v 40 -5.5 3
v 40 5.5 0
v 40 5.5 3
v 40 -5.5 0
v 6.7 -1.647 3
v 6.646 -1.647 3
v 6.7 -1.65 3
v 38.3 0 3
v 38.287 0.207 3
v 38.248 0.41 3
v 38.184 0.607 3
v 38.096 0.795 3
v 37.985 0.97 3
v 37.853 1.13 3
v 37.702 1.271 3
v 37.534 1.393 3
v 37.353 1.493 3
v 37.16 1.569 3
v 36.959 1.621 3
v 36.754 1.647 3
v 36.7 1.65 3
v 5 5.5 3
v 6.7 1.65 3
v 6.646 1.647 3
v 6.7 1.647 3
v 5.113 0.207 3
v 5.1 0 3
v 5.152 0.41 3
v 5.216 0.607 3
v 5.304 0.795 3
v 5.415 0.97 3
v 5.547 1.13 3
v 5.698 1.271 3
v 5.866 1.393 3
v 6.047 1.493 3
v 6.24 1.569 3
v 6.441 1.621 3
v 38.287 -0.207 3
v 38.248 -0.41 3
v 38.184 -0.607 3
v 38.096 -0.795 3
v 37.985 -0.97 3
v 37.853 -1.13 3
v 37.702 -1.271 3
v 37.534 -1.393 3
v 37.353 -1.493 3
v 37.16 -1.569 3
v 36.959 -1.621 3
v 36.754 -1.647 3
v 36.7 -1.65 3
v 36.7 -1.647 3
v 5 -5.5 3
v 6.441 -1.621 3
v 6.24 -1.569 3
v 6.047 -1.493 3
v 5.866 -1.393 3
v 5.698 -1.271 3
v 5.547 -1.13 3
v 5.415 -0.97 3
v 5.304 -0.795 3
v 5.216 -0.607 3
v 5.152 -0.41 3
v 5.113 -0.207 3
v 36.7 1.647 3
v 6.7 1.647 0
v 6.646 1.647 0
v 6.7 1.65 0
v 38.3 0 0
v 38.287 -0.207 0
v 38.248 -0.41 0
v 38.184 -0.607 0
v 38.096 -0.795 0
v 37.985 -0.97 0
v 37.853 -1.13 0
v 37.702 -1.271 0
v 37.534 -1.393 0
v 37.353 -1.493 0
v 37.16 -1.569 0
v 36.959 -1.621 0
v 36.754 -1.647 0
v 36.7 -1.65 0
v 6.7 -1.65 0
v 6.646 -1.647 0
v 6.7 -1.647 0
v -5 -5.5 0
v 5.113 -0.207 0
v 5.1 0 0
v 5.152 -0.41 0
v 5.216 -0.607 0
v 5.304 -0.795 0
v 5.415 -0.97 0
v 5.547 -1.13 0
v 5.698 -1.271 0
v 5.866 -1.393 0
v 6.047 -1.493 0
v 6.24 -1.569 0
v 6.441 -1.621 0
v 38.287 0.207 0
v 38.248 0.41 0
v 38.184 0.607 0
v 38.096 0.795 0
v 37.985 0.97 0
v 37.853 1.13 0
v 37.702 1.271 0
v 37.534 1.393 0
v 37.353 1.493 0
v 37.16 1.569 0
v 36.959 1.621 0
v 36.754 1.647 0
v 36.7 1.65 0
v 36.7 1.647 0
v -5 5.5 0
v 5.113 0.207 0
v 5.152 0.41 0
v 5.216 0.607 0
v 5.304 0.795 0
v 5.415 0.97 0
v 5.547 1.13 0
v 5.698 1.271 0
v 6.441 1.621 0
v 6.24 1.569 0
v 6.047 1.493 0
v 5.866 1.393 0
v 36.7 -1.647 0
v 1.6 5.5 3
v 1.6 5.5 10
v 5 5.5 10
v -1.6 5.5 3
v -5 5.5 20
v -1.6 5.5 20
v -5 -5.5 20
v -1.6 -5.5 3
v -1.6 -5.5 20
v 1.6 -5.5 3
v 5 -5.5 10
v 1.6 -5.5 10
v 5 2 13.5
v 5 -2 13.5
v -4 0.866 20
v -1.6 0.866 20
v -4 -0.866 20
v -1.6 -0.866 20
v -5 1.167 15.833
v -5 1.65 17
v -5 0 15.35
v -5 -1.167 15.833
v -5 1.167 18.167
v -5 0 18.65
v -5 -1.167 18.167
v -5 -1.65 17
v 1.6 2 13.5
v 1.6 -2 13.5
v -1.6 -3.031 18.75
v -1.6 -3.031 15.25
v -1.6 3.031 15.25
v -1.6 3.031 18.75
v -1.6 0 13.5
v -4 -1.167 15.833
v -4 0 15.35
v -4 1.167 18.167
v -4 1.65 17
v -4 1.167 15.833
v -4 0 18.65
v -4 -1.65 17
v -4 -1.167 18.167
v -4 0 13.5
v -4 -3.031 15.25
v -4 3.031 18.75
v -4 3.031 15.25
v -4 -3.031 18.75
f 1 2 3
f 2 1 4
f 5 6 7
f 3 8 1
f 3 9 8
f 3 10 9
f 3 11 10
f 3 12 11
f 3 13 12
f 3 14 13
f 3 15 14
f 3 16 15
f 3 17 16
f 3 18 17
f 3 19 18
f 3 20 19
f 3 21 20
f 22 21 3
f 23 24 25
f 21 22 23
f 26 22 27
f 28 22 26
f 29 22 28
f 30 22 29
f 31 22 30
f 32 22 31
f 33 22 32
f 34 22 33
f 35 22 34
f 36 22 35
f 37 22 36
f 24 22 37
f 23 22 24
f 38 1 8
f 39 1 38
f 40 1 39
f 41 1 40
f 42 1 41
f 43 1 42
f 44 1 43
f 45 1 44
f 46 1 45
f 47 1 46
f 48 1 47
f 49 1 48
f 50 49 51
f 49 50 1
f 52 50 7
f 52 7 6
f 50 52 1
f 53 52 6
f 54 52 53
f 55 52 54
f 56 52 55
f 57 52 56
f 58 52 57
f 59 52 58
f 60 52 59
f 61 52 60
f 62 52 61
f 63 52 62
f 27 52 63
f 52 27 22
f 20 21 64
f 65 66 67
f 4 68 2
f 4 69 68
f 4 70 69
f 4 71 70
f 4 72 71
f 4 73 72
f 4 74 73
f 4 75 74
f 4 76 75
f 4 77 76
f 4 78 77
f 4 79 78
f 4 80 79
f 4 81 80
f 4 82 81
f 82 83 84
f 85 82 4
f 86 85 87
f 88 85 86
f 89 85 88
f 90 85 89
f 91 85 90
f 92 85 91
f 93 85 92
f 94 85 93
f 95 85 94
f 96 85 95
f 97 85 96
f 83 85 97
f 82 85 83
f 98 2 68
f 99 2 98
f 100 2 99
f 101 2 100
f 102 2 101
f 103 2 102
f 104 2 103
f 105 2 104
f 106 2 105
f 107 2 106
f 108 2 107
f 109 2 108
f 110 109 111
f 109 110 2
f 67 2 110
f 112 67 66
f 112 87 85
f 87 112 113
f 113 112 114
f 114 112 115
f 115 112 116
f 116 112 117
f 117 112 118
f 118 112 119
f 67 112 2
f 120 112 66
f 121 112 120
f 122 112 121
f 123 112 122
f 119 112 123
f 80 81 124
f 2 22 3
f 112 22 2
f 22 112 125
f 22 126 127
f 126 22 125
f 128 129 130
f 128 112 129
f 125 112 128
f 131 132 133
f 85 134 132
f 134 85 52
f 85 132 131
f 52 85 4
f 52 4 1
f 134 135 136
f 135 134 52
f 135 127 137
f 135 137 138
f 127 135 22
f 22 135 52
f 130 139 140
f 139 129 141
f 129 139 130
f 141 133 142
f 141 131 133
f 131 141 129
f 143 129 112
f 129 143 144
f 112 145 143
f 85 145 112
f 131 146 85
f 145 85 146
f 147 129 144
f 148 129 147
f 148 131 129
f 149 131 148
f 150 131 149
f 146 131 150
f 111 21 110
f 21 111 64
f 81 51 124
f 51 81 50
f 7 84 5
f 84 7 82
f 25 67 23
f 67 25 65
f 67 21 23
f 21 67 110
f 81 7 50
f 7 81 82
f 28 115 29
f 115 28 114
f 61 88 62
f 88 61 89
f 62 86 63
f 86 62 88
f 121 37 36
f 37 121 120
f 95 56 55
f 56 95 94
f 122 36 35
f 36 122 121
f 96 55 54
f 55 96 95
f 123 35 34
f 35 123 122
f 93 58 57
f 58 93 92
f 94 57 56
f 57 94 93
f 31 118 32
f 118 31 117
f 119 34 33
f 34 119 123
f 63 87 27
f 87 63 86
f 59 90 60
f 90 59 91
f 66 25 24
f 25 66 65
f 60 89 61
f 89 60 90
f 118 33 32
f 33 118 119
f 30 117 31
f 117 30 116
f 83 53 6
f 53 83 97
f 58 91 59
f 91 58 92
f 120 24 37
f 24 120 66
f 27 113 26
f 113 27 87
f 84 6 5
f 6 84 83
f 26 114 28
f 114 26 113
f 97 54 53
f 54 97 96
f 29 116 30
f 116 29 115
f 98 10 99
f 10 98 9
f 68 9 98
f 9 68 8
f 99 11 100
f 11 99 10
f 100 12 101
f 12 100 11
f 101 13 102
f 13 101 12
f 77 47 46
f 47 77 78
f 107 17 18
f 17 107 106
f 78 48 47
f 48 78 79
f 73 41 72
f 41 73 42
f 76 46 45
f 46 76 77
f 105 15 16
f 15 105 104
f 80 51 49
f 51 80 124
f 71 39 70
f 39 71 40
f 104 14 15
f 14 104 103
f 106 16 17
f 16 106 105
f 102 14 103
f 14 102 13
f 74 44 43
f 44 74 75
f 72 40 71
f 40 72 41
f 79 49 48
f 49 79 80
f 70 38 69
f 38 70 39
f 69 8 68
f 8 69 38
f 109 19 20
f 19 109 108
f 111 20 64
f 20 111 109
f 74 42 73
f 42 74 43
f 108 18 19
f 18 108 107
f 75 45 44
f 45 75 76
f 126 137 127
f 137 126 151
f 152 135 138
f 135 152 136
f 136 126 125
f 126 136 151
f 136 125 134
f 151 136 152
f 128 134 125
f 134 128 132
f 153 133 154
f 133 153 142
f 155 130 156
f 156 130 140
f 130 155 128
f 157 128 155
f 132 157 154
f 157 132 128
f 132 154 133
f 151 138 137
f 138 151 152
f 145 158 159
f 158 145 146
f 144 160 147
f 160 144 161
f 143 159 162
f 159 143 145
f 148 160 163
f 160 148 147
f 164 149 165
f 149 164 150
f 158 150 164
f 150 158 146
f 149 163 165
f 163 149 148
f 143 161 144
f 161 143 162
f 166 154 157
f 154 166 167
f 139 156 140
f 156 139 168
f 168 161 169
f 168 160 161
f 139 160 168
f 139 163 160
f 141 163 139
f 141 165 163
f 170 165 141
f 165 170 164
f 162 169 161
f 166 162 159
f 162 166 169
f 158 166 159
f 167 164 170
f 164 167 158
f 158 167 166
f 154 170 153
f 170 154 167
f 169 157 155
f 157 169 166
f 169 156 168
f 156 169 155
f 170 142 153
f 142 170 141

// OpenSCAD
// Robot DC-motor: sensor keyesIR - holder

// Vertical part.
h_vert = 40;
w_vert = 11;
d_vert =  3;

// Internal diameter of nut.
id_nut = 3.3;

// Out diameter of nut.
od_nut = 7;

// Height of nut.
h_nut = 4;

// Length and diameter of screws.
len_screw = 20;
dia_screw = 3.3;

// Horizontal part.
h_horiz = 10;
w_horiz = 11;
d_horiz =  20;

// Width of chassis.
w_chassis = 3.2;

// Vertical hole.
h_vhole = h_vert - 2*id_nut - (h_horiz - w_chassis)/2;
w_vhole = id_nut;
d_vhole =  10;

// Width of chassis.
w_chassis = 3.2;

// Horizontal hole.
h_hhole = w_chassis;
w_hhole = w_horiz+1;
d_hhole = d_horiz;

// Block of nut.
h_nut_hole = (h_horiz - w_chassis)/2 + 1;
w_nut_hole = w_horiz+1;
d_nut_hole = od_nut;


module solid_part() {
  union() {
// Vertical part.
    translate([h_vert/2, 0, d_vert/2])
      cube([h_vert, w_vert, d_vert], center = true);
    
// Horizontal part.
    translate([0, 0, d_horiz/2])
      cube([h_horiz, w_horiz, d_horiz], center = true);
  }    
}    

module  holes() {
    
  union() {    
// Vertical hole.
    translate([h_vhole/2 + id_nut + (h_horiz - w_chassis)/2, 0, d_vhole/2 - 0.5])  
      cube([h_vhole, w_vhole, d_vhole], center = true);
    translate([(h_vhole/2 + (h_horiz - w_chassis)/2-d_vhole-w_vhole/2),0,0])
        cylinder(r=w_vhole/2, h=d_vhole, center=true, $fn = 50);
    translate([(h_vhole/2 + (h_horiz - w_chassis)/2+d_vhole+w_vhole/2+ id_nut*2),0,0])
        cylinder(r=w_vhole/2, h=d_vhole, center=true, $fn = 50); 
     
    translate([0,w_vert/2,d_vert*2+4])
      rotate([45,0,0])
        cube([6,6,6]);
    translate([0,-w_vert/2,d_vert*2+4])
      rotate([45,0,0])
        cube([6,6,6]);
    
// Horizontal hole.
    translate([0, 0, d_horiz/2 + d_vert])
      cube([h_hhole, w_hhole, d_hhole], center = true);  

// Block of nut.
    translate([(h_horiz - w_chassis)/2, 0, d_horiz/2 + d_nut_hole])
      cube([h_nut_hole, w_nut_hole, d_nut_hole], center = true);  

// Screw hole.
    translate([0, 0, d_horiz/2 + d_nut_hole])
      rotate(a=[0,90,0])      
        cylinder(h = len_screw, r1 = dia_screw/2, r2 = dia_screw/2, $fn = 8, center = true);      
        

// Nut hole.
    translate([-h_nut/2, 0, d_horiz/2 + d_nut_hole])
      rotate(a=[ 0, 90, 0])      
        cylinder(h = h_nut, r1 = od_nut/2, r2 = od_nut/2, $fn = 6, center = true);      
  }      

}

difference() {
  solid_part();
  holes();  
} 
